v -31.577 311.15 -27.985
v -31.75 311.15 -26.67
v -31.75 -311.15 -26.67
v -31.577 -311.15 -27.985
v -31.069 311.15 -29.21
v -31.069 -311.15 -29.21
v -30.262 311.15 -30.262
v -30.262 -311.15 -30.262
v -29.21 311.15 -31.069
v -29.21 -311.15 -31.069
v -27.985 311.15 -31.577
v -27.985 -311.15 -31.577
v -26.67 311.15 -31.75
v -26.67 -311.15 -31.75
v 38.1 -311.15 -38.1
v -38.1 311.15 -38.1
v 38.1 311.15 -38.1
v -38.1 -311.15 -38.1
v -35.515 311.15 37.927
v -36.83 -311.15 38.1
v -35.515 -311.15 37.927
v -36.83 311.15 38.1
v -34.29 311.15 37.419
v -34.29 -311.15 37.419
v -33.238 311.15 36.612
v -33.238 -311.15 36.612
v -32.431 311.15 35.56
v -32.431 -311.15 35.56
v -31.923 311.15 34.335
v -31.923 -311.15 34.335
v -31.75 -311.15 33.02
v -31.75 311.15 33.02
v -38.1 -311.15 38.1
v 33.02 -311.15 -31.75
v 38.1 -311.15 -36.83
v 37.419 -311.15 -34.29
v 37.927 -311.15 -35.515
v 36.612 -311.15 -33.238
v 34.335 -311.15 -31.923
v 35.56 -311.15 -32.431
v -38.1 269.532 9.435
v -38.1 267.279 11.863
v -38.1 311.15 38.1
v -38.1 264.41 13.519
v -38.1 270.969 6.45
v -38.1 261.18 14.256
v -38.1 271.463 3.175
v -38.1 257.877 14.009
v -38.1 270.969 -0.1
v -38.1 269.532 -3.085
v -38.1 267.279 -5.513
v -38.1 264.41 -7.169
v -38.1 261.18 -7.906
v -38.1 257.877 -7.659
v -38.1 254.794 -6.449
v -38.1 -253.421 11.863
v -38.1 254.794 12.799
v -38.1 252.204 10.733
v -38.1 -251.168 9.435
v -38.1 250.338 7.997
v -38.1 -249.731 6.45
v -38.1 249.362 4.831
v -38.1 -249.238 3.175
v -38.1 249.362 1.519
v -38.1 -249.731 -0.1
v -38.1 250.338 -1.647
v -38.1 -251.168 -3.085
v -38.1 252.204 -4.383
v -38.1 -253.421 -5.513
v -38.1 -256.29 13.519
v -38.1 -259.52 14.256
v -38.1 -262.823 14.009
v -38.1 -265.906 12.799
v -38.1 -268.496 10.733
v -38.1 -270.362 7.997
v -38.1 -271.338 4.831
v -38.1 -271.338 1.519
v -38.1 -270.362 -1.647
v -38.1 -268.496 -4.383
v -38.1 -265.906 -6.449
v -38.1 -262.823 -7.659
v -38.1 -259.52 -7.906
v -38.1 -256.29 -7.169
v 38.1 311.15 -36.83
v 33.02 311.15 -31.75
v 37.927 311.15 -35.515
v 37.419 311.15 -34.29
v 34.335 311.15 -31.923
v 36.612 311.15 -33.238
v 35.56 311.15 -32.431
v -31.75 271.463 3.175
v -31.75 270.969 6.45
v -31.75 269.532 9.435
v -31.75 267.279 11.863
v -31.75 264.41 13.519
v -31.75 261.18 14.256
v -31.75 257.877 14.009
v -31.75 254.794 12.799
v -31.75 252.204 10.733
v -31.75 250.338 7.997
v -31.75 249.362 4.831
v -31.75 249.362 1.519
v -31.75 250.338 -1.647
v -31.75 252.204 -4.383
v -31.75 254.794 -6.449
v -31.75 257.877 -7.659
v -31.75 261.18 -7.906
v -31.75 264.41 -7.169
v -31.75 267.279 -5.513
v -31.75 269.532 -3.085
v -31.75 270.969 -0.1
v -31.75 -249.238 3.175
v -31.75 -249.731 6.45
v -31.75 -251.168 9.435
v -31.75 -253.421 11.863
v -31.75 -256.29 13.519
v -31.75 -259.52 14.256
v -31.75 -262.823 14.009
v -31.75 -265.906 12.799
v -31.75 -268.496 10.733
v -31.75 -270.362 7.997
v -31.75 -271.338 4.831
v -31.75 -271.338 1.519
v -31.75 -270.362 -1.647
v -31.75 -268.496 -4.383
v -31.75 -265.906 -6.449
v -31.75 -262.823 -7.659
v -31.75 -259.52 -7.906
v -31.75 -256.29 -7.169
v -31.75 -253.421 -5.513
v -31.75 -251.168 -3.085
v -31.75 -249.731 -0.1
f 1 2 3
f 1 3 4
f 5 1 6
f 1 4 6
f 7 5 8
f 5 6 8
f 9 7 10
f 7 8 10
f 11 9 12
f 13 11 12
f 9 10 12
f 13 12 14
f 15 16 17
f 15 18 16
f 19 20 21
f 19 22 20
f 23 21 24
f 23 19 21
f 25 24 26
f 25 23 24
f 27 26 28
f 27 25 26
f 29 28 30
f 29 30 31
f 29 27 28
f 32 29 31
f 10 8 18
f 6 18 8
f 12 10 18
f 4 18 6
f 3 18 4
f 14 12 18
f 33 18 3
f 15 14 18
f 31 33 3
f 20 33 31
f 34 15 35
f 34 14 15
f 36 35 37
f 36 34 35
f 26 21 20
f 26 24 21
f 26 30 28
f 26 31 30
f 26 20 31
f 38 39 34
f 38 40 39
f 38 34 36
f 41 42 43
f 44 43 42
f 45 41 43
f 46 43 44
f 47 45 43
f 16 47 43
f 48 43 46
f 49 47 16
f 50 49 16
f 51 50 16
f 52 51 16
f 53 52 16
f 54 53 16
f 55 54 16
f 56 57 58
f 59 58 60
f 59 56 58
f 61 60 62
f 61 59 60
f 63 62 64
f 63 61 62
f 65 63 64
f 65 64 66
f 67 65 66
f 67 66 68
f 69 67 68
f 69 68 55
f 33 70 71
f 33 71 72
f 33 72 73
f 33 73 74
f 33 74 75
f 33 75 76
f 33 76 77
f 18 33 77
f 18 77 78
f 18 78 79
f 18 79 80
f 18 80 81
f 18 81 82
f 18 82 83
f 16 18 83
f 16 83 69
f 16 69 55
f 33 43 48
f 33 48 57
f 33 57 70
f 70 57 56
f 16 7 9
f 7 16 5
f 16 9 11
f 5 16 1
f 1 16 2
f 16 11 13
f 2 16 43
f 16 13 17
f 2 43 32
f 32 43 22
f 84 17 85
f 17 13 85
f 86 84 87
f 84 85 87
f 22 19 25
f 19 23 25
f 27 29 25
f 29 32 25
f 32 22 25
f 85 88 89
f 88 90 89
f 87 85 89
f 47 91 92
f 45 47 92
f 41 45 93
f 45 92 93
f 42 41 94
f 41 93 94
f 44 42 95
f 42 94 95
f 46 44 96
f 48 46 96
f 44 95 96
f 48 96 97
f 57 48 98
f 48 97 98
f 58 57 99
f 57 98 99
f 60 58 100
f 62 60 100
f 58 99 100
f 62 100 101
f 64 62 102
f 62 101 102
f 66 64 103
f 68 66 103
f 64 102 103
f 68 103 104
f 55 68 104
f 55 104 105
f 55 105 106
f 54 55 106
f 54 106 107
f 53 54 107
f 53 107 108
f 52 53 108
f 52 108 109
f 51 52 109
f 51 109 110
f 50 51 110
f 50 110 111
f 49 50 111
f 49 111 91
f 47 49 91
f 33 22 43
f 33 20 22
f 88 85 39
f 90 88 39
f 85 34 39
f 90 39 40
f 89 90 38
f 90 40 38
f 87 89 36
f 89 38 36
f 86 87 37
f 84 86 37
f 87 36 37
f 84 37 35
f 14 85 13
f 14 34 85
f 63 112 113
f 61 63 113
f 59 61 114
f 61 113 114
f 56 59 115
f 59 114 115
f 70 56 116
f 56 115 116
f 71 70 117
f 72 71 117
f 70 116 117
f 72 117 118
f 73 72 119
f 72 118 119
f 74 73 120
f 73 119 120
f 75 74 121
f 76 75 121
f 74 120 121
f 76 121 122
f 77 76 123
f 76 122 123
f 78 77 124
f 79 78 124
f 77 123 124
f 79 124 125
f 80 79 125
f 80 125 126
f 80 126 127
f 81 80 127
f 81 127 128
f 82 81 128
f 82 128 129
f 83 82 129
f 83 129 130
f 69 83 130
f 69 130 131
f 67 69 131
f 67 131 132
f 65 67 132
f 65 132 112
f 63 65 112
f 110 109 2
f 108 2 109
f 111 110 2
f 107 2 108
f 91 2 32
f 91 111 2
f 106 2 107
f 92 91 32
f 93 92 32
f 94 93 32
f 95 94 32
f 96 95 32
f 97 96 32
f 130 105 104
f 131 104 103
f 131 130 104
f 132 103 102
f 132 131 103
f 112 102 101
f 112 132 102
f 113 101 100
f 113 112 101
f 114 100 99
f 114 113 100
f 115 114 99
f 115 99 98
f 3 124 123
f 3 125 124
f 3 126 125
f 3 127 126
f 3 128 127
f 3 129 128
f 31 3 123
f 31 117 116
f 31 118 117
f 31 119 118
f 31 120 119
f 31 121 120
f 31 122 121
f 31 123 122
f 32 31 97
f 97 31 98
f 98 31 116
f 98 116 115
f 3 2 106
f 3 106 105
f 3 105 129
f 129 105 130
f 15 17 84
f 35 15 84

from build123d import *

# Parameters (mm, degrees)
F1_DEPTH = 311.15
F2_R     = 5.08
F3_R     = 11.1125
F4_DEPTH = 25.4


with BuildPart() as f1:
    # F0 (on Front) → F1 (new body, symmetric)
    with BuildSketch(Plane.XZ):
        Polygon((-38.1, -38.1), (38.1, -38.1), (38.1, -31.75), (-31.75, -31.75), (-31.75, 38.1), (-38.1, 38.1), align=None)
    extrude(amount=F1_DEPTH, both=True)

    # F2
    f2_edges = [f1.edges().sort_by_distance(p)[0] for p in [
        (-31.75, 0, 38.1),
        (-31.75, 0, -31.75),
        (38.1, 0, -31.75),
    ]]
    fillet(f2_edges, radius=F2_R)

    # F3 (on face) → F4 (cut)
    with BuildSketch(Plane.YZ.offset(-31.75)):
        with Locations((260.35, 3.175)):
            Circle(F3_R)
        with Locations((-260.35, 3.175)):
            Circle(F3_R)
    extrude(amount=-F4_DEPTH, mode=Mode.SUBTRACT)


solid = f1.part
